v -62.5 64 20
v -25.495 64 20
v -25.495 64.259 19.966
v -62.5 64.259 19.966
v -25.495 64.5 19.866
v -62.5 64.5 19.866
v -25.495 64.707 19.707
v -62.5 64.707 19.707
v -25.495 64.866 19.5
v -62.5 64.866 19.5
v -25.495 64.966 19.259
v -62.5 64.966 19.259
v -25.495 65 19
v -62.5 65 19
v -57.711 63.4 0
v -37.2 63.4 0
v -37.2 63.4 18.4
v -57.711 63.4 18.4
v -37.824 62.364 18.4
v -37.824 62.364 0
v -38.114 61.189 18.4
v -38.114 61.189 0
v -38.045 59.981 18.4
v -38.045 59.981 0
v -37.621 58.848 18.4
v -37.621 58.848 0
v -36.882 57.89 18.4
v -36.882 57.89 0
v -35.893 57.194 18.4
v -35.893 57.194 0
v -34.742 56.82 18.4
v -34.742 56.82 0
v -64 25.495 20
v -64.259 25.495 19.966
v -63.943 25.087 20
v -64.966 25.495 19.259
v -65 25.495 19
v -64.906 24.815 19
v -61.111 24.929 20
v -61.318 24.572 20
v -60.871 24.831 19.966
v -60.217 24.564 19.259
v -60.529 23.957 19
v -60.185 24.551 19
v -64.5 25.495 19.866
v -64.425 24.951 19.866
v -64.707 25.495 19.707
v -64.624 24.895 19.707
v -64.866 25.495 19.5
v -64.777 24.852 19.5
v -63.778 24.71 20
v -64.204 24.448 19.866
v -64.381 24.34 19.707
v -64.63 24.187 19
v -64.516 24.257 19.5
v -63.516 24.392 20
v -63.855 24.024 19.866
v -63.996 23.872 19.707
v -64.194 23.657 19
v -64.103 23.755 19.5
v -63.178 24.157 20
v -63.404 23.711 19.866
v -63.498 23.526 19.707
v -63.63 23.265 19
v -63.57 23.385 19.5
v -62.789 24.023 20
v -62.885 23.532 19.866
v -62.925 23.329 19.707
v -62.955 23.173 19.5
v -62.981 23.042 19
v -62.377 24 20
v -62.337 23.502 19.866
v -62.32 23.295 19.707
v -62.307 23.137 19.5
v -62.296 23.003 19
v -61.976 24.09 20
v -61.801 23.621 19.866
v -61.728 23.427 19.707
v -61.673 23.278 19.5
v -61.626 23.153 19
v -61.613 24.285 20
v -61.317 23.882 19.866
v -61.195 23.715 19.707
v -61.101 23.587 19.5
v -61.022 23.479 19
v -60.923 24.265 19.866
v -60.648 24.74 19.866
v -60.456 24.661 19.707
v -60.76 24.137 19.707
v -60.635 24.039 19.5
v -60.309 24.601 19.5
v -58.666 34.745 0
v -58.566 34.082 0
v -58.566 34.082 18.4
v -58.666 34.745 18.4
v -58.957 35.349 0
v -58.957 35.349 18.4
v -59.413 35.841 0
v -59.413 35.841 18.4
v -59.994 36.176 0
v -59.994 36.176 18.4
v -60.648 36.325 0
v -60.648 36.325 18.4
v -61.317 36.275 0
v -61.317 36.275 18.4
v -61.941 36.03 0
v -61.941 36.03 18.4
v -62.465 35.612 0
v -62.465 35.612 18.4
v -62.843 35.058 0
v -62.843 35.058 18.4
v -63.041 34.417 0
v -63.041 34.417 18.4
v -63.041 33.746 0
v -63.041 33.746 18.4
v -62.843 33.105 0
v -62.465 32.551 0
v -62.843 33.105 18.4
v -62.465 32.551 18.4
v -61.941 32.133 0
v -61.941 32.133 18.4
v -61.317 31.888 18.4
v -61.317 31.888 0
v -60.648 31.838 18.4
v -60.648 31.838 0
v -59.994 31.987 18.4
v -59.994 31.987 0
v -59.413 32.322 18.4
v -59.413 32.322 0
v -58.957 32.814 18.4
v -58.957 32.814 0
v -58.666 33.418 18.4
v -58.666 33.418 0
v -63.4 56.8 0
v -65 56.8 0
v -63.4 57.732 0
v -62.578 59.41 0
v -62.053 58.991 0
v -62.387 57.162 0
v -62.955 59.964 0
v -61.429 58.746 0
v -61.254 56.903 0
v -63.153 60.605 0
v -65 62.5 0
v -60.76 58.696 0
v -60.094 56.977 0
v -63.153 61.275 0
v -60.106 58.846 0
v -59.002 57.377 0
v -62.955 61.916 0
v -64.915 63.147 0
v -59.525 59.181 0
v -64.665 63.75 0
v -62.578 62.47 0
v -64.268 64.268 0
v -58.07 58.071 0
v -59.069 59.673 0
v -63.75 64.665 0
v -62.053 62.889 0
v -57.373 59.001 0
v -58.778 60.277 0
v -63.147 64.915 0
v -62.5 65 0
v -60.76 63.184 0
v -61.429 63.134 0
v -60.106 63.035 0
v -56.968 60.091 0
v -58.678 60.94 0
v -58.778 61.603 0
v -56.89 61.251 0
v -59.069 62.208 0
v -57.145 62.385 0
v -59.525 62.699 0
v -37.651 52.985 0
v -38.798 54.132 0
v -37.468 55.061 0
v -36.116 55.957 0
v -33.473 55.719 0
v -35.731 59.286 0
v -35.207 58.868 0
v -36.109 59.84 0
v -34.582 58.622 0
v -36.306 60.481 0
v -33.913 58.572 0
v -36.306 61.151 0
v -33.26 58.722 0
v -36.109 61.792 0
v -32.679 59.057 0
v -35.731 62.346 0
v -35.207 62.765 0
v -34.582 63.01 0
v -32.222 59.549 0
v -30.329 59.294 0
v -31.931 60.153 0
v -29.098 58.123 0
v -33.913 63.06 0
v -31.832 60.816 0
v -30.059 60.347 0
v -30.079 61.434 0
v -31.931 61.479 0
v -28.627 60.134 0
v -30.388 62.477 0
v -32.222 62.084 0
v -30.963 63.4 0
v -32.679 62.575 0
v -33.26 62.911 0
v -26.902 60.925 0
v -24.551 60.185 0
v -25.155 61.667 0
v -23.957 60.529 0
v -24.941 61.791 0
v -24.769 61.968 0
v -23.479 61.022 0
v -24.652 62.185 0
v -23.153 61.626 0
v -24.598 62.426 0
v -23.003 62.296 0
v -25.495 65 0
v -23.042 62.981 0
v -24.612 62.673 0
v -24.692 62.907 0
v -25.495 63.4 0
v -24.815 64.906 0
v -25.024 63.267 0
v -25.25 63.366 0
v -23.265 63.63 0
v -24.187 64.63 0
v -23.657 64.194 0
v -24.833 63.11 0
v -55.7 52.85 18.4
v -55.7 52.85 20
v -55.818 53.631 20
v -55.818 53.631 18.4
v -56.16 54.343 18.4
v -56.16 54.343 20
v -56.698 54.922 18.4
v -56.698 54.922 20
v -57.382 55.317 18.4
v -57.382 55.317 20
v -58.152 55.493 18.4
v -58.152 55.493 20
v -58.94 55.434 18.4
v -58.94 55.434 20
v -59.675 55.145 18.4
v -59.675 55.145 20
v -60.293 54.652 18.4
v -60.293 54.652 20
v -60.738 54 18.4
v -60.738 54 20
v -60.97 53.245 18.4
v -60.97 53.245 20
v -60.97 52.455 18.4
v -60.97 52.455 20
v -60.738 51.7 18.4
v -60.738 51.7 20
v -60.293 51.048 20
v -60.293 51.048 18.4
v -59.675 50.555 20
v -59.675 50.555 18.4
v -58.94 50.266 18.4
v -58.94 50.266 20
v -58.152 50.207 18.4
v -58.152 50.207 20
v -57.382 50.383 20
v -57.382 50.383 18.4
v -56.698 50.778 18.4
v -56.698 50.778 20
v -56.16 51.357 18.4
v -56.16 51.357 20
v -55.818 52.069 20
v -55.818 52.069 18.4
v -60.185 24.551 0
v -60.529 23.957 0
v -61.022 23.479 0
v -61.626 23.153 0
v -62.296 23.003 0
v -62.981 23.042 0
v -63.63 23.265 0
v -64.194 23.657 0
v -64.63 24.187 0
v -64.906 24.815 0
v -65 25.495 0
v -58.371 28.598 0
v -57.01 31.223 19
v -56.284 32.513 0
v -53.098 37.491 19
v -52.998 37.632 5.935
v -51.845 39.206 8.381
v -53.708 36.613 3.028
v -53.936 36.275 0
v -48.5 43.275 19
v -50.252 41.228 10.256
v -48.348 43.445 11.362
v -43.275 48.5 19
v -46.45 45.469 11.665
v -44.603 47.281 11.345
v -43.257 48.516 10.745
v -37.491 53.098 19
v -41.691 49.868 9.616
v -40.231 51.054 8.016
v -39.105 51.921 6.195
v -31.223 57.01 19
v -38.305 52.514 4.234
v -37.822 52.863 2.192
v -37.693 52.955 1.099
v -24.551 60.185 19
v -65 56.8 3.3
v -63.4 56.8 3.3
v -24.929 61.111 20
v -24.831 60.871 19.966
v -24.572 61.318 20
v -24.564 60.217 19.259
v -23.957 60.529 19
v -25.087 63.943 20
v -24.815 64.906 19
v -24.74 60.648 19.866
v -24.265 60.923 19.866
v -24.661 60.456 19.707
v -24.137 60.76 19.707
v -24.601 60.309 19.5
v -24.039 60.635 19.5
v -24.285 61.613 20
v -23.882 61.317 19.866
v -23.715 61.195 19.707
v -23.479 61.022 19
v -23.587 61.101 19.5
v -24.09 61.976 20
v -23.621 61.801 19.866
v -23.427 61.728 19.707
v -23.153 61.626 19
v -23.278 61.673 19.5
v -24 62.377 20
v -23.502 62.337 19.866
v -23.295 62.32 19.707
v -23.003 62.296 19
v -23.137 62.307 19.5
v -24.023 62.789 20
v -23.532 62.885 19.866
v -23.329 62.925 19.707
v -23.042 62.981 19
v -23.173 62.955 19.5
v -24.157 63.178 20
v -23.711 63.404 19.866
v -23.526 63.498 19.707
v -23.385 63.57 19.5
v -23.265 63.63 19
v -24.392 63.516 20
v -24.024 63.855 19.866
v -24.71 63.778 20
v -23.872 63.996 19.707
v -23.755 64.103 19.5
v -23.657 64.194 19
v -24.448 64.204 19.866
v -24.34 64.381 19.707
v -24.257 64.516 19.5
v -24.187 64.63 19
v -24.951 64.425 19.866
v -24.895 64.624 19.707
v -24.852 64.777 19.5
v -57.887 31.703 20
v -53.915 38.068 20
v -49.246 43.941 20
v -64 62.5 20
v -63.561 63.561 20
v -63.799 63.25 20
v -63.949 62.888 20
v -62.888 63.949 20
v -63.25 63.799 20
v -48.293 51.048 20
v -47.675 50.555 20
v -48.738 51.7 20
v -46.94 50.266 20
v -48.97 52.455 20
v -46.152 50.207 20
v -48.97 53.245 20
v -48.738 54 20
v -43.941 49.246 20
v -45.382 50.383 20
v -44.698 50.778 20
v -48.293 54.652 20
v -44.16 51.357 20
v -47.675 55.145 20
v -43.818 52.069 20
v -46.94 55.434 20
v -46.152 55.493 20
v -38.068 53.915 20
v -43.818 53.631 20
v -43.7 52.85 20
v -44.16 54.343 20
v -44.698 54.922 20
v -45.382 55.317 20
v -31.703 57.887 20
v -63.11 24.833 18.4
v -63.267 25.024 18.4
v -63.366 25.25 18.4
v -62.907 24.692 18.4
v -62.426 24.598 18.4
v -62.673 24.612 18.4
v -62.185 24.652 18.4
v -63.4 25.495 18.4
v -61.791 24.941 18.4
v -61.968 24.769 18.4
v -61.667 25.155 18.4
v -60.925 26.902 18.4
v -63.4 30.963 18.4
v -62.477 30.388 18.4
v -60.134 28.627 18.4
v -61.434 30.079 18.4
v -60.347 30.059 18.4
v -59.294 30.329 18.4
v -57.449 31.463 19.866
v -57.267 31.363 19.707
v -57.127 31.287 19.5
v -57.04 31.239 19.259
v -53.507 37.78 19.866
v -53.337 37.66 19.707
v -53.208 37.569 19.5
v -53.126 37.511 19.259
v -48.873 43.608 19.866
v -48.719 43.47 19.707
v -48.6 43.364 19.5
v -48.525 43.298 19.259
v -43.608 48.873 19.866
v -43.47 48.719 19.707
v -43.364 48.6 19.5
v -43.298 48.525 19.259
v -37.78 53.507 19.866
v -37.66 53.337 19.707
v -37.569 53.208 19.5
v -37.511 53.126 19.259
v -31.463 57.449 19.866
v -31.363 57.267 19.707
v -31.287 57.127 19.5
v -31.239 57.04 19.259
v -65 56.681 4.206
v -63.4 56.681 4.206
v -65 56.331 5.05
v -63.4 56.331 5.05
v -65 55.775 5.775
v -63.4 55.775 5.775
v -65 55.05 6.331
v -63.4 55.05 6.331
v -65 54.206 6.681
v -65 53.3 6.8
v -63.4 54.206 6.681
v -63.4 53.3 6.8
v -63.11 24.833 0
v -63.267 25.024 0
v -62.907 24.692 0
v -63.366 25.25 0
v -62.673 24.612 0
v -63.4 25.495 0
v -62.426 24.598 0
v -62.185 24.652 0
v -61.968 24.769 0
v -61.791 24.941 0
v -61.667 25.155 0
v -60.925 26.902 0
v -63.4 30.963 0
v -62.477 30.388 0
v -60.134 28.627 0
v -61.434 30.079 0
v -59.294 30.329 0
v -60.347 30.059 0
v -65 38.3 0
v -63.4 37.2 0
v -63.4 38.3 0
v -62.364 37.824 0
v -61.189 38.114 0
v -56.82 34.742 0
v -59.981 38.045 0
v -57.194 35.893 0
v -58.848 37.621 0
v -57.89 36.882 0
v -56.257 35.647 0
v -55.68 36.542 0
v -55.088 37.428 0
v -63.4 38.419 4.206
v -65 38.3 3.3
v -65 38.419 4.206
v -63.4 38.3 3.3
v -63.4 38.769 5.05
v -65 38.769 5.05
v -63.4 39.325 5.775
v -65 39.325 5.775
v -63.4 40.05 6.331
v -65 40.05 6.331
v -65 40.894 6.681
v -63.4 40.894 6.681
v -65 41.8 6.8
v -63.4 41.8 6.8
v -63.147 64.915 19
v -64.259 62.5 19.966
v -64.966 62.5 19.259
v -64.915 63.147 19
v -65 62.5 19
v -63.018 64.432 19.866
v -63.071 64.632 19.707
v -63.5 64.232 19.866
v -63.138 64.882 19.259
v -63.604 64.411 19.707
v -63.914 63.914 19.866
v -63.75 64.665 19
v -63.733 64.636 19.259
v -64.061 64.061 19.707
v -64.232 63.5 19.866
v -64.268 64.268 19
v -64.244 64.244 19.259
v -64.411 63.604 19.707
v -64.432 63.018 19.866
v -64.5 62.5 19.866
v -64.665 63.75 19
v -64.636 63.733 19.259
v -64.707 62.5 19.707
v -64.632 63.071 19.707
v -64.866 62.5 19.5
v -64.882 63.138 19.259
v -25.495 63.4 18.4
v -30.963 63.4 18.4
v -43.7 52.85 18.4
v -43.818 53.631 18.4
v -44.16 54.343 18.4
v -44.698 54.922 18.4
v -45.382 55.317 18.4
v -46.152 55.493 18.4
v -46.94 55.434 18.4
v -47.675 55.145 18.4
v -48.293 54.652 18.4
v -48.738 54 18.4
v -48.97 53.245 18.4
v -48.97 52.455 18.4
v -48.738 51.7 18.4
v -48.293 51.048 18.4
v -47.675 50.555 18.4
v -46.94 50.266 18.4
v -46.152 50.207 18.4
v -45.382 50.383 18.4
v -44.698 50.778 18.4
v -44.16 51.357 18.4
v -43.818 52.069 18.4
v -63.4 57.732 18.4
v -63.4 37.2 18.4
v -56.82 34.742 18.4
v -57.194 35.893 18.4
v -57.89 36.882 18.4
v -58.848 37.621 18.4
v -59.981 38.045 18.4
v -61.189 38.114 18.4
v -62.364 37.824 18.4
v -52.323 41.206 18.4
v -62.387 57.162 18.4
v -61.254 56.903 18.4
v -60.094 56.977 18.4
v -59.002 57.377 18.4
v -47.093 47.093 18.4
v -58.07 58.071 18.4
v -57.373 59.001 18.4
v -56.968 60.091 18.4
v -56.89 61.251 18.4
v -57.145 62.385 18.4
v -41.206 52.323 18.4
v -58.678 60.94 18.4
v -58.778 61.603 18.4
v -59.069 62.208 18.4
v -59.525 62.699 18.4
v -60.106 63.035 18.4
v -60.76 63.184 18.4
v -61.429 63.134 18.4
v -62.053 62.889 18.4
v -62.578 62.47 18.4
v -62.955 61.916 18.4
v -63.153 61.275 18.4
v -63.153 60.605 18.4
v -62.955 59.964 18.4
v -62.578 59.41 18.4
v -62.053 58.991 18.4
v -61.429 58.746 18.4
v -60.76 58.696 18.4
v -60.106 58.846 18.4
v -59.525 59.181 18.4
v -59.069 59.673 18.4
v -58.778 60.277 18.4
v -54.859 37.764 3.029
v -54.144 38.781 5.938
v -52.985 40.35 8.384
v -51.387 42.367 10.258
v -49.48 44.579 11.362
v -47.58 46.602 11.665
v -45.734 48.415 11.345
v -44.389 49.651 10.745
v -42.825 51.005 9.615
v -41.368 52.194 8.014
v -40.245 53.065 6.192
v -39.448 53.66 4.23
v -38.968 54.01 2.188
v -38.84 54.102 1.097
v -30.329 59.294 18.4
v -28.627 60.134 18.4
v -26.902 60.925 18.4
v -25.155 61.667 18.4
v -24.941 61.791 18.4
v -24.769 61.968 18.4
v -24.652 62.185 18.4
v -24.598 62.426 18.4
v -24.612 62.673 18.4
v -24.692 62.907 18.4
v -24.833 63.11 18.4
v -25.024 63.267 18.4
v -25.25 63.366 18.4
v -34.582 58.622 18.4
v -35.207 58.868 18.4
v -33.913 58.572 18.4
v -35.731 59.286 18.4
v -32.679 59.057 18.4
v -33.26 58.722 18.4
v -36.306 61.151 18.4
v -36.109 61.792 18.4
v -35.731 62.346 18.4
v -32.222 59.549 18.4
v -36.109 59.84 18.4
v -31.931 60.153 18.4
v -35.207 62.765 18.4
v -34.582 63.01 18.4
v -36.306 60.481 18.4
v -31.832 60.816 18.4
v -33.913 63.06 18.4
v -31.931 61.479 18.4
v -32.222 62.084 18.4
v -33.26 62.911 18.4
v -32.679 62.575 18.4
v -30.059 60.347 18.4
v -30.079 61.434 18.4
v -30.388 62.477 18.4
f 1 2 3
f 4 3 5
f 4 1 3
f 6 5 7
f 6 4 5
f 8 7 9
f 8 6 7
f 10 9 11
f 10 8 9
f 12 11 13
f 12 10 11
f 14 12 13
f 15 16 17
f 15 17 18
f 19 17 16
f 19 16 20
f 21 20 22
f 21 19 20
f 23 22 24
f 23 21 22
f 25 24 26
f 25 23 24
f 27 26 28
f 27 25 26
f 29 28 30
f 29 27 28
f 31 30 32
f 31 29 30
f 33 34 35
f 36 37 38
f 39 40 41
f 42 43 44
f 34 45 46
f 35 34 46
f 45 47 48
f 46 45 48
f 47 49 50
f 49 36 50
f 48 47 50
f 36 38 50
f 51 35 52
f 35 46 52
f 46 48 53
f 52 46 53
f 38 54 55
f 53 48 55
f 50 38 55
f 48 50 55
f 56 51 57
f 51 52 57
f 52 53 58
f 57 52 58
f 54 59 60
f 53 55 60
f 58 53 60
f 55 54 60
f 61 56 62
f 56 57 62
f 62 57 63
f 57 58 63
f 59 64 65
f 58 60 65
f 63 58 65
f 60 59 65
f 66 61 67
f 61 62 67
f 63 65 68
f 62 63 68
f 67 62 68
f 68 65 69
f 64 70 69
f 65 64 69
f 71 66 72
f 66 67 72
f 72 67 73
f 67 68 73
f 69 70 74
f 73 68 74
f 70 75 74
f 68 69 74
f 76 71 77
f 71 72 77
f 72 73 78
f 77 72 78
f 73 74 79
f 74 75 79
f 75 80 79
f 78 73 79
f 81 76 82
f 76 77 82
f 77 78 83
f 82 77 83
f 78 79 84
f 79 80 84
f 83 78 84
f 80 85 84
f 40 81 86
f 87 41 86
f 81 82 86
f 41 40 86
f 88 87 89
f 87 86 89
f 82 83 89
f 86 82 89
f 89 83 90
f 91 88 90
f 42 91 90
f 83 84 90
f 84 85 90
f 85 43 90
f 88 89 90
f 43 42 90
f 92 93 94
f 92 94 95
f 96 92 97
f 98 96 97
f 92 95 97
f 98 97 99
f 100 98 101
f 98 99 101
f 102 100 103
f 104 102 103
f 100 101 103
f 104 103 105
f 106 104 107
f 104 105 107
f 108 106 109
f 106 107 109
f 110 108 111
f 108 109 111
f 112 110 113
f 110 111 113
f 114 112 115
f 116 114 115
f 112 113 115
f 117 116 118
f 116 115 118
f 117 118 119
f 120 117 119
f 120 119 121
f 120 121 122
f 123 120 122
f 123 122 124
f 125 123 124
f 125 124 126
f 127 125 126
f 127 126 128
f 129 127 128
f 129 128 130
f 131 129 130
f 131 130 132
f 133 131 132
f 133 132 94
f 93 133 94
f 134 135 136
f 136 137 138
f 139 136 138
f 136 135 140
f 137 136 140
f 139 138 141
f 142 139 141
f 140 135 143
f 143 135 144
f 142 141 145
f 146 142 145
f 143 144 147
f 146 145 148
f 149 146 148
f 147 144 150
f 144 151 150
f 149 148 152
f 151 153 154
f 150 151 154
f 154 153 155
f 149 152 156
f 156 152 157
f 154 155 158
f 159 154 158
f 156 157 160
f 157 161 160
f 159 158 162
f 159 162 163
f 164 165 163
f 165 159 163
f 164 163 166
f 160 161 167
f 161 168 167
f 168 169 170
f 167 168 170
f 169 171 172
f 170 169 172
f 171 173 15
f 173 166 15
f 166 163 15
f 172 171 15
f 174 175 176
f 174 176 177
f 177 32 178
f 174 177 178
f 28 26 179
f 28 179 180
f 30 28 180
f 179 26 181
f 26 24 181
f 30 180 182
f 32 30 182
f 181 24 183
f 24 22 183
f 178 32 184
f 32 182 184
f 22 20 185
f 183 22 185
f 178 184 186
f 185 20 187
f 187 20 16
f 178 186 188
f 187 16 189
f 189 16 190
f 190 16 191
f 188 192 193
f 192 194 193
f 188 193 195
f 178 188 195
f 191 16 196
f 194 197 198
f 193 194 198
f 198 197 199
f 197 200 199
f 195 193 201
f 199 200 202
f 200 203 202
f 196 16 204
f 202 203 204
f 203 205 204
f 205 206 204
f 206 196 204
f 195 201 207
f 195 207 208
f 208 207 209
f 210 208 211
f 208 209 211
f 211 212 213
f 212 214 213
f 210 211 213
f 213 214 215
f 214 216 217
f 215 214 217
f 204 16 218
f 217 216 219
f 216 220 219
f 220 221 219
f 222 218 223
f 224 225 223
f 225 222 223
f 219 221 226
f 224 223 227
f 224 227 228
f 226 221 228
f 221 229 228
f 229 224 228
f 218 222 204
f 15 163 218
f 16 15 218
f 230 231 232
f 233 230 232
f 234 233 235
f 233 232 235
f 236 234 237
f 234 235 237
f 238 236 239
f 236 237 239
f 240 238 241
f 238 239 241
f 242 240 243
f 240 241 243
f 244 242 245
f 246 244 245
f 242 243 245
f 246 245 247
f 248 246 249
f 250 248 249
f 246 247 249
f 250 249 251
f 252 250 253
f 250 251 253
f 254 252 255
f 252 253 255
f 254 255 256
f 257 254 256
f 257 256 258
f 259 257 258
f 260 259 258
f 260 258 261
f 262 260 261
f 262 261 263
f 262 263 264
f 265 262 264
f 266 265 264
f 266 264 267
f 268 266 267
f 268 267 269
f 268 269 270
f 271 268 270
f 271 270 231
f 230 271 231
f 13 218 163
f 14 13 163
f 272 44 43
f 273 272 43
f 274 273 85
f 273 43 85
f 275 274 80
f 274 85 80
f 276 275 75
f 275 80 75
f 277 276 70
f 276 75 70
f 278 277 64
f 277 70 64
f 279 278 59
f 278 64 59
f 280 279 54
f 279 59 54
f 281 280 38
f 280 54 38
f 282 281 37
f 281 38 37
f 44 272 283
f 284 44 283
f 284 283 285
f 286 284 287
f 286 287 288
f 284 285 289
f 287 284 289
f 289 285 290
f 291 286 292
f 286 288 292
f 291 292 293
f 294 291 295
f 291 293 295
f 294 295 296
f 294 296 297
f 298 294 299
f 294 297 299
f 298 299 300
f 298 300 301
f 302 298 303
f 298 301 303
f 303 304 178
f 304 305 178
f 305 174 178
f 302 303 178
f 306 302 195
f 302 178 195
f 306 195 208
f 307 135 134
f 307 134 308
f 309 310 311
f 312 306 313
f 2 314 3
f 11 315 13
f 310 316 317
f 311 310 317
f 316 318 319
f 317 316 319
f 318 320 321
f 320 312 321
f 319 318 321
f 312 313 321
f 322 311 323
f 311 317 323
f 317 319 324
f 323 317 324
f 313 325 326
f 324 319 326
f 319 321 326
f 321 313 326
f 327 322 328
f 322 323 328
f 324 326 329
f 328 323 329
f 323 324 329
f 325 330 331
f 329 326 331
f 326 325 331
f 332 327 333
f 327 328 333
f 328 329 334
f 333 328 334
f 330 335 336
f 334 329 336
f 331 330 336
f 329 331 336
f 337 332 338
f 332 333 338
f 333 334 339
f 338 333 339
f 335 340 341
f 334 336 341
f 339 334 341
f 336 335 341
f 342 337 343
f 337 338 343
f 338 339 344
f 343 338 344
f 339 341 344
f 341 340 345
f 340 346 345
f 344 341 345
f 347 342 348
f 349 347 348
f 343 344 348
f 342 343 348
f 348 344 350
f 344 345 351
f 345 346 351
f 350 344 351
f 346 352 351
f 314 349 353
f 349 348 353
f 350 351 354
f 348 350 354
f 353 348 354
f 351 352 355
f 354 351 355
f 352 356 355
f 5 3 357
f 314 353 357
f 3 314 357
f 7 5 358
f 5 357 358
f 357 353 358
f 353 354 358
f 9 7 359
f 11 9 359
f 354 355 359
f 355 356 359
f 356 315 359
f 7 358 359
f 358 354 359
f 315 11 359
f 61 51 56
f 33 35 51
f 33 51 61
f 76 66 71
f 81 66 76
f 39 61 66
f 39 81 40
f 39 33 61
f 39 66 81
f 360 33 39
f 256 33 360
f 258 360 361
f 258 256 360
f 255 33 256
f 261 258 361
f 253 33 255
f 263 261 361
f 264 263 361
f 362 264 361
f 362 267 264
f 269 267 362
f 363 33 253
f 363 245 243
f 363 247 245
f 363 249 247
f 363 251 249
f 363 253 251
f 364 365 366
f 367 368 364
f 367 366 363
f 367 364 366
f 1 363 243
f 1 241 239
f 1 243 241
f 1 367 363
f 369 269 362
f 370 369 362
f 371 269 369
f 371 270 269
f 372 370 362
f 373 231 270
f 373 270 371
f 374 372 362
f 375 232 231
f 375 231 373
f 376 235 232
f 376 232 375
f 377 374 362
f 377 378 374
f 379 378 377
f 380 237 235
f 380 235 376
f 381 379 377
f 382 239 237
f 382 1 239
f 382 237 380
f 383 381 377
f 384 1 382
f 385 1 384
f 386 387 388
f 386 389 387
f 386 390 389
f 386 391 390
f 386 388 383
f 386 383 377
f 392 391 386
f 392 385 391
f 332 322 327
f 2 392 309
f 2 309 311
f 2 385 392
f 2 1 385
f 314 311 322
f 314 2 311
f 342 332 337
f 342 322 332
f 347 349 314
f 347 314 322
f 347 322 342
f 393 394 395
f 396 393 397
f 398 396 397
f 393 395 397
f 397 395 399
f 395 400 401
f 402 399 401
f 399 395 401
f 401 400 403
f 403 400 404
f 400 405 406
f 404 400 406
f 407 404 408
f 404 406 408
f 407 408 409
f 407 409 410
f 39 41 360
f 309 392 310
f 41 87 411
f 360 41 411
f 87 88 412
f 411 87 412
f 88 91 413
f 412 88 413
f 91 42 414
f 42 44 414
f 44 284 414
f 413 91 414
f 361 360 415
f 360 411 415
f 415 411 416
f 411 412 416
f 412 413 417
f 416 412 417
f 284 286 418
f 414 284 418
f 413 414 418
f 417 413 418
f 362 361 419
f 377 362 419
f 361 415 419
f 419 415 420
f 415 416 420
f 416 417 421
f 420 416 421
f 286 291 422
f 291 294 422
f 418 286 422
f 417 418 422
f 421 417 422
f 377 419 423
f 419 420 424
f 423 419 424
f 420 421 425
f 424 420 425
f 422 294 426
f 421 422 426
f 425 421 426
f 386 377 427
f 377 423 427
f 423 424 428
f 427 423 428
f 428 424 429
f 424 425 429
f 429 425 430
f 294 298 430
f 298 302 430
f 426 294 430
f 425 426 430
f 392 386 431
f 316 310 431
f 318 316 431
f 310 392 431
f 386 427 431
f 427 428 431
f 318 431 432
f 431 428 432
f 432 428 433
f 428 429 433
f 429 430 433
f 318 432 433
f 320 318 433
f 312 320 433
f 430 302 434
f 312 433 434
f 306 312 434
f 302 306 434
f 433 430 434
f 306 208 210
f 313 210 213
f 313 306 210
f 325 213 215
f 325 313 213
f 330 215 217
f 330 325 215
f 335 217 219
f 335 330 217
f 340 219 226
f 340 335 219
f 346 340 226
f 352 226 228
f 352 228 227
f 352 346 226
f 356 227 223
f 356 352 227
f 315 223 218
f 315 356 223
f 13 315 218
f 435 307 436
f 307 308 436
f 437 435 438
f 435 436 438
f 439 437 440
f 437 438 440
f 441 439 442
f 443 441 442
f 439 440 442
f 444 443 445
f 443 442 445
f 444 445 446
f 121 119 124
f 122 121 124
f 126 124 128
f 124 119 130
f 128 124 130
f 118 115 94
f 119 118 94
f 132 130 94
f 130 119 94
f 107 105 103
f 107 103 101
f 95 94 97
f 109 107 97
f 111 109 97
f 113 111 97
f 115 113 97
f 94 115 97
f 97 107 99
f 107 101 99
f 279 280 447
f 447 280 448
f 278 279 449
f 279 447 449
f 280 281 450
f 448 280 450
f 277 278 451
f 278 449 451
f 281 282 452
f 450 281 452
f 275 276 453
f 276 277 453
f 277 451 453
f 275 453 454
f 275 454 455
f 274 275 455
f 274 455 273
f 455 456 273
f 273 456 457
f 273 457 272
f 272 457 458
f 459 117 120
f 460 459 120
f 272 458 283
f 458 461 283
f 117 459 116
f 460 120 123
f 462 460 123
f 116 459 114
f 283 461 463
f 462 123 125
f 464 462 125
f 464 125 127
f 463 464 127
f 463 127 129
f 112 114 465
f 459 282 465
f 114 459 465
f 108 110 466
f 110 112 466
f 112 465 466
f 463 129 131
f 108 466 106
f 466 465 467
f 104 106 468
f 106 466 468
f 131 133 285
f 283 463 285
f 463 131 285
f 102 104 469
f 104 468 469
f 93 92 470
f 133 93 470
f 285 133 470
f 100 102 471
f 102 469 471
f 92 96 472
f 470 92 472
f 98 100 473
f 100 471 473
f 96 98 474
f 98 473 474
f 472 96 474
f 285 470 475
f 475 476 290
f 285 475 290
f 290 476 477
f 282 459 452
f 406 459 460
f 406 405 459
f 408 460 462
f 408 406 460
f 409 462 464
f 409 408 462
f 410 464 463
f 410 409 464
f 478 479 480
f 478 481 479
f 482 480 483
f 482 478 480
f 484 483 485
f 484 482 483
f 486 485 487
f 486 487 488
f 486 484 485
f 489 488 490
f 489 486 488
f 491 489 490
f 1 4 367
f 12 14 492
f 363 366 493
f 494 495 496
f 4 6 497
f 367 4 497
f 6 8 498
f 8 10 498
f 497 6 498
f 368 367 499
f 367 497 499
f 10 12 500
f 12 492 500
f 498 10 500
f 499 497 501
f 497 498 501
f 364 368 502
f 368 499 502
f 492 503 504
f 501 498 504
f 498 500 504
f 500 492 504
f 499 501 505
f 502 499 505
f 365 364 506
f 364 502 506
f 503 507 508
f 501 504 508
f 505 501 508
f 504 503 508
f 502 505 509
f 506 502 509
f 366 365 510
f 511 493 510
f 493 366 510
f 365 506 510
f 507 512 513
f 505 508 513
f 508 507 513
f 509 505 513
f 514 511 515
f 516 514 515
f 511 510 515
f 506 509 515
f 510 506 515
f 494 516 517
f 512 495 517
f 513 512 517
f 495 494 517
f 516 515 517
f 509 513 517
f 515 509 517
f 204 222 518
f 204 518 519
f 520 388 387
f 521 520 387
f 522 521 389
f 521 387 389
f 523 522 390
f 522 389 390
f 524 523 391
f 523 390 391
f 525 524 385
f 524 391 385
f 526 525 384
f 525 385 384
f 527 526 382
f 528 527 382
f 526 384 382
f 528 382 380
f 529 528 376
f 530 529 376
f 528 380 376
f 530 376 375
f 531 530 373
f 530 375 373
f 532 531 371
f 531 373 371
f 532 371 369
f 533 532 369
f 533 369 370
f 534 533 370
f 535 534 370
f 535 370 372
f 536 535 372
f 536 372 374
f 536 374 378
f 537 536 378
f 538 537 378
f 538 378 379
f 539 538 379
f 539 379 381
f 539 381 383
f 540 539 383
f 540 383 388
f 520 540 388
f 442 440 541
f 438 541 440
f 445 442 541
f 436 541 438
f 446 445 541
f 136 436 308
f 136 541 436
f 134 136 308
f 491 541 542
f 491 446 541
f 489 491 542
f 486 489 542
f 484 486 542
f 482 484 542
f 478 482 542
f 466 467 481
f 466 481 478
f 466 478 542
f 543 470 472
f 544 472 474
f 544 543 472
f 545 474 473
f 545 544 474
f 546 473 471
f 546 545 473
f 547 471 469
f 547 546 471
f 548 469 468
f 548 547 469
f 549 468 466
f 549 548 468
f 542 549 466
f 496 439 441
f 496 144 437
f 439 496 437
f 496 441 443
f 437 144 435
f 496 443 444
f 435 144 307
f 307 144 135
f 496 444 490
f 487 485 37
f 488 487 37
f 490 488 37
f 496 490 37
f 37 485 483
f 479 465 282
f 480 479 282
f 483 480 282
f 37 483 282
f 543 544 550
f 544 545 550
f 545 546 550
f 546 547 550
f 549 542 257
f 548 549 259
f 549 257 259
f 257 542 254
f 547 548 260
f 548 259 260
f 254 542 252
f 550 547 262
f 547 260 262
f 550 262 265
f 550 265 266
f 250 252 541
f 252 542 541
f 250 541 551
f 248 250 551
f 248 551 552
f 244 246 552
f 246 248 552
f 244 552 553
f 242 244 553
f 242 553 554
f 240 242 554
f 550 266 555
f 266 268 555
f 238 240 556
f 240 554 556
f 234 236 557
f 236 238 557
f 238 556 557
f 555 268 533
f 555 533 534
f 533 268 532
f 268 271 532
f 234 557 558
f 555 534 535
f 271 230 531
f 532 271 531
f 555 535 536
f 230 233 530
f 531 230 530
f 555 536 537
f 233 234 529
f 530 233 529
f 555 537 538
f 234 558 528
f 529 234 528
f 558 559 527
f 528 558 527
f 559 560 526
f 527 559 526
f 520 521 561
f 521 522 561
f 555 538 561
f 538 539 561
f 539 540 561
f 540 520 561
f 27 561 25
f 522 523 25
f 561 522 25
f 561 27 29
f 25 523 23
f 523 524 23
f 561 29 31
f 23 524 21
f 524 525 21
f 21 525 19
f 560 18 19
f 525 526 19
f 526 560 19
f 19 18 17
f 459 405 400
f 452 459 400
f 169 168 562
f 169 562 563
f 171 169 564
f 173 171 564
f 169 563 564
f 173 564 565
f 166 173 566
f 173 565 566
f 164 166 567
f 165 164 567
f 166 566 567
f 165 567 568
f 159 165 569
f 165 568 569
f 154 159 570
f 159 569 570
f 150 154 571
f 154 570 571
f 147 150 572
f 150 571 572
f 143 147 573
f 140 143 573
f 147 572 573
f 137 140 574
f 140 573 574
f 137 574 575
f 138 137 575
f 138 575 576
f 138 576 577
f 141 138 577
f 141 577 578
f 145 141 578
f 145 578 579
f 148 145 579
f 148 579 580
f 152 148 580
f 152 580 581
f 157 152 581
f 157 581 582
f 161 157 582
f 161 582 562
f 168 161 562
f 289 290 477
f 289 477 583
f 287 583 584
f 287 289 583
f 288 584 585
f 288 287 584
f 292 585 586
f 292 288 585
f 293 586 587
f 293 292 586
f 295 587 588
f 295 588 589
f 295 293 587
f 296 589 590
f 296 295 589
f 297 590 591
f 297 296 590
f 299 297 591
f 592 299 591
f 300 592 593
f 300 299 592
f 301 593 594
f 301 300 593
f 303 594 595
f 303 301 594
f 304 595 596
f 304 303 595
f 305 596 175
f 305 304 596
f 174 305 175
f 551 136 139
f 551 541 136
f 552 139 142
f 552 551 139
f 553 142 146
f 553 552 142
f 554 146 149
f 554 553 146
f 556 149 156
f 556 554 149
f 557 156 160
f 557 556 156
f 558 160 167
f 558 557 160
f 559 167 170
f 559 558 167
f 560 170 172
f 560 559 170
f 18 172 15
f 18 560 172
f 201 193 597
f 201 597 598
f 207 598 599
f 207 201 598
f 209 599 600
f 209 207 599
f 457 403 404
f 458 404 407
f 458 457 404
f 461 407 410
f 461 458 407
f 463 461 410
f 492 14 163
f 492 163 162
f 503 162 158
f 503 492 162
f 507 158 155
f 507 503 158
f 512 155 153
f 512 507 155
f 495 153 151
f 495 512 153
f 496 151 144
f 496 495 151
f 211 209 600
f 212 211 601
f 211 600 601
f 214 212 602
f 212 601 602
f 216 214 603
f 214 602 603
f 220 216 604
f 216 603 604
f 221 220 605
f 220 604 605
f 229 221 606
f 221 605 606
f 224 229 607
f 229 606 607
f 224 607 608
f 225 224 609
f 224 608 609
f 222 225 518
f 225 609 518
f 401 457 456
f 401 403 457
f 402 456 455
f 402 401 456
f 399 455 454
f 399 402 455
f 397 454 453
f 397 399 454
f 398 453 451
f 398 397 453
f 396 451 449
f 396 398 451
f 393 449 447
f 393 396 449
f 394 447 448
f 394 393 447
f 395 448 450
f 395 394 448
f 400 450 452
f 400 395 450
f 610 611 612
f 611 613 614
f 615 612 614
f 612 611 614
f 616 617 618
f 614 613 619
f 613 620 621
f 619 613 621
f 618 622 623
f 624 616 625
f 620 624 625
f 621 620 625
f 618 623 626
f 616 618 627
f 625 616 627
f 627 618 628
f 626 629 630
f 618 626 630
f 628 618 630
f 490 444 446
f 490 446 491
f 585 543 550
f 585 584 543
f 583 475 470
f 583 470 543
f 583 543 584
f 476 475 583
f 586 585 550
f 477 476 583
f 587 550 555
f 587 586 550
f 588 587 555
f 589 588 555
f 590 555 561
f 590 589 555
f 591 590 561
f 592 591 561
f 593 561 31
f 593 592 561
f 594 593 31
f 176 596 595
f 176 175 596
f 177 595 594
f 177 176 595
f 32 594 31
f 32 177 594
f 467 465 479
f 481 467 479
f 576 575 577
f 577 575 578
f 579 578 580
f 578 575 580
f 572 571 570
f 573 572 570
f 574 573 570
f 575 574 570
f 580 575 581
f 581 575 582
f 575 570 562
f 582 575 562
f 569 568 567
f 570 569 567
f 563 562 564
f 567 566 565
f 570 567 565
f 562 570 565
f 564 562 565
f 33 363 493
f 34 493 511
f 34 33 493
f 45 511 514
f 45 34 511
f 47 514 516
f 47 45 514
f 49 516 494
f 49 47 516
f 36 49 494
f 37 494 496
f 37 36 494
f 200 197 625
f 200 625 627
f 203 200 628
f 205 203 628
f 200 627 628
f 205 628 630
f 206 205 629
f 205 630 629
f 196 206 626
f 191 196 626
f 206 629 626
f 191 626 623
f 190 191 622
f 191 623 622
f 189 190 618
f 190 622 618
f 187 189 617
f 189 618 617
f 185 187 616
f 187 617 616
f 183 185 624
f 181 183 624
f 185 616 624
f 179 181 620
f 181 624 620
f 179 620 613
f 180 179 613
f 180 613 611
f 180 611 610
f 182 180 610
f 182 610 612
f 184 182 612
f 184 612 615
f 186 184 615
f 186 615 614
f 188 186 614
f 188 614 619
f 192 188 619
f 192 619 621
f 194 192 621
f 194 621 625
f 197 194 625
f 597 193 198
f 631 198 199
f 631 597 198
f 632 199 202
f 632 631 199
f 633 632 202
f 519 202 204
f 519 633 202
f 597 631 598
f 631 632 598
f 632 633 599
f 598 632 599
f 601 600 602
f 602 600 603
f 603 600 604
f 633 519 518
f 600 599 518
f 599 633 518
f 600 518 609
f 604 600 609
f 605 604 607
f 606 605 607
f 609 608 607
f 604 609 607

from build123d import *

# Parameters (mm, degrees)
F1_DEPTH  = 20
F2_R      = 2.5
F3_T      = -1.6
F4_R      = 4.05
F4_R_2    = 2.25
F5_DEPTH  = 20
F6_W      = 18.5
F6_H      = 6.8
F7_DEPTH  = 7.7
F9_R      = 11.6656058432
F10_DEPTH = 24.5
F11_R     = 3.5
F12_R     = 1
F4_R_3    = 2.65
F13_DEPTH = 25


with BuildPart() as f1:
    # F0 (on Top) → F1 (new body)
    with BuildSketch(Plane.XY):
        with BuildLine():
            ThreePointArc((-65, 0), (-45.9619407771, 45.9619407771), (0, 65))
            Line((0, 65), (-65, 65))
            Line((-65, 65), (-65, 60))
            Line((-65, 60), (-65, 41.2))
            Line((-65, 41.2), (-65, 0))
        make_face()
    extrude(amount=F1_DEPTH)

    # F2
    f2_edges = [f1.edges().sort_by_distance(p)[0] for p in [
        (-65, 0, 10),
        (0, 65, 10),
        (-65, 65, 10),
    ]]
    fillet(f2_edges, radius=F2_R)

    # F3
    f3_openings = [f1.faces().sort_by_distance(p)[0] for p in [
        (-51.245763, 51.245763, 0),
    ]]
    offset(amount=F3_T, openings=f3_openings)

    # F4 (on face) → F5 (join)
    with BuildSketch(Plane.XY.offset(20)):
        with Locations((-60.9282360965, 60.9400444936)):
            Circle(F4_R)
        with Locations((-60.9282360965, 60.9400444936)):
            Circle(F4_R_2, mode=Mode.SUBTRACT)
        with Locations((-60.8160617149, 34.0815317436)):
            Circle(F4_R)
        with Locations((-60.8160617149, 34.0815317436)):
            Circle(F4_R_2, mode=Mode.SUBTRACT)
        with Locations((-34.0815317436, 60.8160617149)):
            Circle(F4_R)
        with Locations((-34.0815317436, 60.8160617149)):
            Circle(F4_R_2, mode=Mode.SUBTRACT)
    extrude(amount=-F5_DEPTH)

    # F6 (on face) → F7 (cut)
    with BuildSketch(Plane(origin=(-65, 0, 0), x_dir=(0, -1, 0), z_dir=(-1, 0, 0))):
        with Locations((-47.55, 3.4)):
            Rectangle(F6_W, F6_H)
    extrude(amount=-F7_DEPTH, mode=Mode.SUBTRACT)

    # F9 (on face) → F10 (cut)
    with BuildSketch(Plane(origin=(-32.5, 32.5, 0), x_dir=(-0.7071067812, -0.7071067812, 0), z_dir=(-0.7071067812, 0.7071067812, 0))):
        with Locations((0.8223271579, 0)):
            Circle(F9_R)
    extrude(amount=F10_DEPTH, mode=Mode.SUBTRACT)

    # F11
    f11_edges = [f1.edges().sort_by_distance(p)[0] for p in [
        (-64.2, 38.3, 6.8),
        (-64.2, 56.8, 6.8),
    ]]
    fillet(f11_edges, radius=F11_R)

    # F12
    f12_edges = [f1.edges().sort_by_distance(p)[0] for p in [
        (-45.961941, 45.961941, 20),
        (-23.041831, 62.981125, 20),
        (-43.997549, 65, 20),
        (-62.981125, 23.041831, 20),
        (-65, 43.997549, 20),
    ]]
    fillet(f12_edges, radius=F12_R)

    # F4 (on face) → F13 (cut)
    with BuildSketch(Plane.XY.offset(20)):
        with Locations((-58.35, 52.85)):
            Circle(F4_R_3)
        with Locations((-46.35, 52.85)):
            Circle(F4_R_3)
    extrude(amount=-F13_DEPTH, mode=Mode.SUBTRACT)


solid = f1.part
